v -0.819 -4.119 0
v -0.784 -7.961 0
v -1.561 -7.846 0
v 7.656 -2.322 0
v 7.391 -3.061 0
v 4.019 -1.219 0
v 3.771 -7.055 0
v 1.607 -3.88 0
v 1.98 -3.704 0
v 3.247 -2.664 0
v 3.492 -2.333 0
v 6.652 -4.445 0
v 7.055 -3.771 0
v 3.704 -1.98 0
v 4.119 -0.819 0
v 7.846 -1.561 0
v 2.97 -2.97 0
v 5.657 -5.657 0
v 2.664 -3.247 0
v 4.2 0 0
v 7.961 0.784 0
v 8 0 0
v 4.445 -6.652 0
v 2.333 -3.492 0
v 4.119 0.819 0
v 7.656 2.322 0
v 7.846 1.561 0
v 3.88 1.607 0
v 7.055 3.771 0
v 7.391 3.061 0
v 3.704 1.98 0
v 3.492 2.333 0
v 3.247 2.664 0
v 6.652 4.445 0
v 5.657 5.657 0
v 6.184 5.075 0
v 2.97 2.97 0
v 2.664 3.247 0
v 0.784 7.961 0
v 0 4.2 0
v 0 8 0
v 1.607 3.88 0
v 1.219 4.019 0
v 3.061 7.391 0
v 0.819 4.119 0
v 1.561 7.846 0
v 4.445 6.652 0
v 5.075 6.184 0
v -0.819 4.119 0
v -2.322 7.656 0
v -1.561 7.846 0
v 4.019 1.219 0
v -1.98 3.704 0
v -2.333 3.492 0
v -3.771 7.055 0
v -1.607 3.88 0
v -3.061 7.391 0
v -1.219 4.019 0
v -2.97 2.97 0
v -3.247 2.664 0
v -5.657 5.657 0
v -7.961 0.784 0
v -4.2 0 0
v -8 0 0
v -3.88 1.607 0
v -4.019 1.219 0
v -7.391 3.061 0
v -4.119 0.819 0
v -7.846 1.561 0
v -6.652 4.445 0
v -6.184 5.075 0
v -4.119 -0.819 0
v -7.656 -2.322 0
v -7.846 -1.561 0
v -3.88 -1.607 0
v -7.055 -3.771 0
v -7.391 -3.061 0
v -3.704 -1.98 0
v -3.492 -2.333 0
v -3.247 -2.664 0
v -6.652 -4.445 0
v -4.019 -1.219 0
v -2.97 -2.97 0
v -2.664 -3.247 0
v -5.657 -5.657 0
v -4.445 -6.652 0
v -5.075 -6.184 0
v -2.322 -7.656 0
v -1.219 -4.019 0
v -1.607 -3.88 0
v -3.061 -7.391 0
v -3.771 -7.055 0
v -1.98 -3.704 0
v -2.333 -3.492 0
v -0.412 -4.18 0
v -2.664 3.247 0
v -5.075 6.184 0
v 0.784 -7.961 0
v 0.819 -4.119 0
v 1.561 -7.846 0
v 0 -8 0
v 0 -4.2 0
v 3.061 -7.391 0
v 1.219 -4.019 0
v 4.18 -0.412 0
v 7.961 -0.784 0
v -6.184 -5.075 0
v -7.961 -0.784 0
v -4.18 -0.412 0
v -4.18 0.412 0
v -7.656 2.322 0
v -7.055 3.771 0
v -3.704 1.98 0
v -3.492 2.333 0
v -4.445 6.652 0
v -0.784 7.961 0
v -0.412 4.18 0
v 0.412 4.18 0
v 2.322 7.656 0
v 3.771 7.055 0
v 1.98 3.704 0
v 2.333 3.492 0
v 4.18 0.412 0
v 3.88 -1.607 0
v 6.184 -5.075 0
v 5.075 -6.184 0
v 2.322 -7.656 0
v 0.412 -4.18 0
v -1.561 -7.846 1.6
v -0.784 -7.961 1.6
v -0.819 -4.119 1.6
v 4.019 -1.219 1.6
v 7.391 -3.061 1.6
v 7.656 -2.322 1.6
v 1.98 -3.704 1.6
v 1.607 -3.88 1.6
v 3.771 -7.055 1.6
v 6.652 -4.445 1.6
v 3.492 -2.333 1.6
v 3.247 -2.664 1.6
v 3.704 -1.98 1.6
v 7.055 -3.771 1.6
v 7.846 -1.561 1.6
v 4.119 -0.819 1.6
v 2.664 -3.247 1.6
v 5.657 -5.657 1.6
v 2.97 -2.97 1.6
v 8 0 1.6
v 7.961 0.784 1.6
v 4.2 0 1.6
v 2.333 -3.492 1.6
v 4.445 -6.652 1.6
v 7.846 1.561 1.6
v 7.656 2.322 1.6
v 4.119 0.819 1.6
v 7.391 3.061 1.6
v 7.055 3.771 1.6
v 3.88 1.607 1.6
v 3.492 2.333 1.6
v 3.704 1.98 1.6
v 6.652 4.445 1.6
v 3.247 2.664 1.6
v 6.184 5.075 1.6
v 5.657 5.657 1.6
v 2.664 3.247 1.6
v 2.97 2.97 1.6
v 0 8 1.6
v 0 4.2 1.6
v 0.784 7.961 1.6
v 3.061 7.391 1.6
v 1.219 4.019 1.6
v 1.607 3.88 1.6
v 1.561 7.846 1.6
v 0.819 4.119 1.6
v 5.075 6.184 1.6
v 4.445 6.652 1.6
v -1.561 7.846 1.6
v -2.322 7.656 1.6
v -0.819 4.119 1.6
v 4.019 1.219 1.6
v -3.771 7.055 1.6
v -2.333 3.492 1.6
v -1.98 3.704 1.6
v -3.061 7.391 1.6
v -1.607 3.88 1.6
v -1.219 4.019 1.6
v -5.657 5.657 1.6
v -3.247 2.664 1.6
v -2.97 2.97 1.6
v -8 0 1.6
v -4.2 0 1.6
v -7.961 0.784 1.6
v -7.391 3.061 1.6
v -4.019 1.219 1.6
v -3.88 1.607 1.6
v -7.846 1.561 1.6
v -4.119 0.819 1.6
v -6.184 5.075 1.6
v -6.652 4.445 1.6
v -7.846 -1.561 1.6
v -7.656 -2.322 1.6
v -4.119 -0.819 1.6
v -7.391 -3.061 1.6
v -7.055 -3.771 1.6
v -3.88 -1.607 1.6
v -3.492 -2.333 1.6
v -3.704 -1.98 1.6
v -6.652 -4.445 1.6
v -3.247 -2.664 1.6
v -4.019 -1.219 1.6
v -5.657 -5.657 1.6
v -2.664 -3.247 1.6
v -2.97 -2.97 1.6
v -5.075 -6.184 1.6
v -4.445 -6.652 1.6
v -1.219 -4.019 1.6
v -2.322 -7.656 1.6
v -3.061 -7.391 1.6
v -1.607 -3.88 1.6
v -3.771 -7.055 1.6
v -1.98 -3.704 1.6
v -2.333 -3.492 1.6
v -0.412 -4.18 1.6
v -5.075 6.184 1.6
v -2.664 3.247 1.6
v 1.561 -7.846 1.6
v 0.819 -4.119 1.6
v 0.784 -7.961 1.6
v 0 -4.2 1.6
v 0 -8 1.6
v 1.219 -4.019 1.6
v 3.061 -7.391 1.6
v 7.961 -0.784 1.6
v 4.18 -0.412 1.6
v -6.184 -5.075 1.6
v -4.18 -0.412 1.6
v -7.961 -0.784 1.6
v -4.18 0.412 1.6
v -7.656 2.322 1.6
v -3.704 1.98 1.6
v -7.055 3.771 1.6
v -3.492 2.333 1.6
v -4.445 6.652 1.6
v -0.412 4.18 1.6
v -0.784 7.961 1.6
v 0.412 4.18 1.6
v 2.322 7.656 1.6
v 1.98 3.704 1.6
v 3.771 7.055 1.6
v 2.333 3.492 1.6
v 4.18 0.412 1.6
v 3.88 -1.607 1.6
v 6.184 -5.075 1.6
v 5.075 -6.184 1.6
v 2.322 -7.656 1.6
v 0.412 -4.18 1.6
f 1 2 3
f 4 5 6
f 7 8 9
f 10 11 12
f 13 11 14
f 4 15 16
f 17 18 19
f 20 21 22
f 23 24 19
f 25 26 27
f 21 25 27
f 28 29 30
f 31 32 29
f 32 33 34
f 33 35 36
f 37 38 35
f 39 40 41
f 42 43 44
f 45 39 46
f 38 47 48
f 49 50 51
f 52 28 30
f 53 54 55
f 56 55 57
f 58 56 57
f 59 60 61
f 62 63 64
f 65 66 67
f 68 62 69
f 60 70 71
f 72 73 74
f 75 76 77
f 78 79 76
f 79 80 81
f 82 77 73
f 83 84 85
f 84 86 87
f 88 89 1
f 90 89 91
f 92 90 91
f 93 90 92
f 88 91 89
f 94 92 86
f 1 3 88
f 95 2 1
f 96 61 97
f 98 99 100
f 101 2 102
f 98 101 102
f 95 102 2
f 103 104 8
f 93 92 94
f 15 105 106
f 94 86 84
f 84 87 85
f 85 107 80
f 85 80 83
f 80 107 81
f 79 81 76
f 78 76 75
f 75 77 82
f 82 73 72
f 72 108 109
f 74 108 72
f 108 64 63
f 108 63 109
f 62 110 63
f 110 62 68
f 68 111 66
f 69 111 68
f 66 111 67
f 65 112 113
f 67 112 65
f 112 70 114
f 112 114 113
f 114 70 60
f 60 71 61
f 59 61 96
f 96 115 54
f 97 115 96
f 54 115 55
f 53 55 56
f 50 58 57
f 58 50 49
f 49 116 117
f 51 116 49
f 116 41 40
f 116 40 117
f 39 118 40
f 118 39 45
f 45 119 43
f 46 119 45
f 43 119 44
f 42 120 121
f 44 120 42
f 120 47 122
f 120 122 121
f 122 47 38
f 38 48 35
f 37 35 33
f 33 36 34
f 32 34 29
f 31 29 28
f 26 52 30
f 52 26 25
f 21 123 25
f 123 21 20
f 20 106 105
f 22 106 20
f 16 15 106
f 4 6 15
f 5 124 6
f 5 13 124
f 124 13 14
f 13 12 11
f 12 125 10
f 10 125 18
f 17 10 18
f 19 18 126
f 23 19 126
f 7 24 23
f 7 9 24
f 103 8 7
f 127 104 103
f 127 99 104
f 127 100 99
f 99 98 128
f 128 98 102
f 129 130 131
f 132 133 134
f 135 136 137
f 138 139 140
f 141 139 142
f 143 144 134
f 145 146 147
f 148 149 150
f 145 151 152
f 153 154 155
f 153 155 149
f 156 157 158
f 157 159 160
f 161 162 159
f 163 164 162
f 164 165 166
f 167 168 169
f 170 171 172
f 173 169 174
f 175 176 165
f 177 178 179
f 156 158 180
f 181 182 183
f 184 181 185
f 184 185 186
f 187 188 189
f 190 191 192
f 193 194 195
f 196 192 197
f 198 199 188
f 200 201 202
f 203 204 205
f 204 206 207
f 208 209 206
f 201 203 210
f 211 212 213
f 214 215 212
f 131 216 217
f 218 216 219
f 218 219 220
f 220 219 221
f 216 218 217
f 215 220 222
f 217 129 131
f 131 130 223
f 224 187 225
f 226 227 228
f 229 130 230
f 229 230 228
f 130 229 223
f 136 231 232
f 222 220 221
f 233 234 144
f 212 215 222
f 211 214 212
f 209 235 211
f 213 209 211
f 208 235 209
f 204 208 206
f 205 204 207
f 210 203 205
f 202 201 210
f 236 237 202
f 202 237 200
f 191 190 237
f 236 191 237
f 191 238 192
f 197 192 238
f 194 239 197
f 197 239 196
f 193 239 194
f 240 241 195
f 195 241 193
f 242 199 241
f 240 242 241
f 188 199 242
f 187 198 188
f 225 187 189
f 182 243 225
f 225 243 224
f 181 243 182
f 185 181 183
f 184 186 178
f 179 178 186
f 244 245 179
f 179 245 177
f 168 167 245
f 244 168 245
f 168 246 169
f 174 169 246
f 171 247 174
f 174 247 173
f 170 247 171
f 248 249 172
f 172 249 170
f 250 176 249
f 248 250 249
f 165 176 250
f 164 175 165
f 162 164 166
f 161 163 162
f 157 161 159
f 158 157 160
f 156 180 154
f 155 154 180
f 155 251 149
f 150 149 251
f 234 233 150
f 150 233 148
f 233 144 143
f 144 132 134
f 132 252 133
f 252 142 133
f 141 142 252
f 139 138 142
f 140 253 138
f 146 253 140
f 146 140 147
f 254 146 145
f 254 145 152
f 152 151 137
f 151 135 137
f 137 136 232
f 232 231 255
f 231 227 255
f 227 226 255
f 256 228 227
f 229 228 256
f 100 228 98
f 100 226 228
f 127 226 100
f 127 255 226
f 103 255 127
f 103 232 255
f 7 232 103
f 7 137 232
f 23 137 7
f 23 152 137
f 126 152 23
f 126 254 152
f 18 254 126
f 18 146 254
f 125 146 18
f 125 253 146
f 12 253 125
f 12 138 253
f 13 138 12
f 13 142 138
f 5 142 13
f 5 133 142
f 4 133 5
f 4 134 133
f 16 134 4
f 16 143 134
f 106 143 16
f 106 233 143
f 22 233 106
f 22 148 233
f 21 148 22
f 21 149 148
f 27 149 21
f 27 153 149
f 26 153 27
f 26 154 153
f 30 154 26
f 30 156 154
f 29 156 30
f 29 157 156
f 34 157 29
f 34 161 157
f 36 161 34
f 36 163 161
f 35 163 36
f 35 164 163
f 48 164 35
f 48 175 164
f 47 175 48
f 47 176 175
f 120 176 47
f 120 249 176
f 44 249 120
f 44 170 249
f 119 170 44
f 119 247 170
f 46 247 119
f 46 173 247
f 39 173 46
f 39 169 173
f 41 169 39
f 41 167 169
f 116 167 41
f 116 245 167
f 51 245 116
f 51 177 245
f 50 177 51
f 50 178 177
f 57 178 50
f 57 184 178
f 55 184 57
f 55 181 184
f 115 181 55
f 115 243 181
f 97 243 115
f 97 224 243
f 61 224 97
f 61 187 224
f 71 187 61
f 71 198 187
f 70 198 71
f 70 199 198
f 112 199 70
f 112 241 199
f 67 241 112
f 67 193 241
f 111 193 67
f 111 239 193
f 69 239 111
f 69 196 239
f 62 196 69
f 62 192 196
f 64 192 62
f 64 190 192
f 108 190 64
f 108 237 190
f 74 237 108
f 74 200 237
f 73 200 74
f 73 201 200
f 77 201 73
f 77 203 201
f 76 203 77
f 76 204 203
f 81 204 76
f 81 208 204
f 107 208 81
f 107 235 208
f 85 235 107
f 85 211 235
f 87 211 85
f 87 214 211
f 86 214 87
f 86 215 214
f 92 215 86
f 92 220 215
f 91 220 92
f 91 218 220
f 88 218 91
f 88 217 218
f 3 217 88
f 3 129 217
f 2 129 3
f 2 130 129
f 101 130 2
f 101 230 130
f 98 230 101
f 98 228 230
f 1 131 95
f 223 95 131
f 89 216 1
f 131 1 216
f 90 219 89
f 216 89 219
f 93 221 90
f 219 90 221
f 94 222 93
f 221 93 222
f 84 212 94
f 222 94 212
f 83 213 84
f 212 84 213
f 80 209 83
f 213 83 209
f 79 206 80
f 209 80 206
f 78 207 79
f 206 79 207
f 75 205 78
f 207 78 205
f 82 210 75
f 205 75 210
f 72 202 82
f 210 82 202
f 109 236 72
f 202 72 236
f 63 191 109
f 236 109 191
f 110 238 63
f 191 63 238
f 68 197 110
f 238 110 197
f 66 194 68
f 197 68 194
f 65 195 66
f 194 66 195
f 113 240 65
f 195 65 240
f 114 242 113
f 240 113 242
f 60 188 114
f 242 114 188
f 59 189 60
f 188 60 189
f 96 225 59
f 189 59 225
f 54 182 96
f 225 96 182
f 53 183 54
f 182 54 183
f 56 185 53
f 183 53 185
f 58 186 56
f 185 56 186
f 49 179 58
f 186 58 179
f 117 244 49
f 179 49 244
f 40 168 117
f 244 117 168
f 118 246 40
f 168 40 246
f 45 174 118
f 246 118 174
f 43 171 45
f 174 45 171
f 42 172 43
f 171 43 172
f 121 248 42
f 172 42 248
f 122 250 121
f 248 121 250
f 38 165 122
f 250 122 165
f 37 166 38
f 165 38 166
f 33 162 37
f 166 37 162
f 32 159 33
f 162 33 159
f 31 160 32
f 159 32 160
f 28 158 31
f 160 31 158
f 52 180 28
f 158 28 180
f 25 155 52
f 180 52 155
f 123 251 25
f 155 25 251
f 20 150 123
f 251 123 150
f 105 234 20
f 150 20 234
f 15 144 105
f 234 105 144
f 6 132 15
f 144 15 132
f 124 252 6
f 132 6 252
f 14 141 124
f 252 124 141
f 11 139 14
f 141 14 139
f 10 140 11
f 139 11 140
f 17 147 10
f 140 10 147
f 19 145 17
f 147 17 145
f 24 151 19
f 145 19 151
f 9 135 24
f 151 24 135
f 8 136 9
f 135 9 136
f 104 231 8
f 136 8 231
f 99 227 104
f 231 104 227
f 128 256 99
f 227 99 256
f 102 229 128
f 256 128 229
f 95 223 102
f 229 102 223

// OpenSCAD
// SPDX-License-Identifier: MIT
// Wrapper: render this file directly (NO -D needed, works in every shell):
//   openscad -o washer.stl examples/washer.scad
SHOW = "washer";
include <../tq_threads_examples.scad>;
